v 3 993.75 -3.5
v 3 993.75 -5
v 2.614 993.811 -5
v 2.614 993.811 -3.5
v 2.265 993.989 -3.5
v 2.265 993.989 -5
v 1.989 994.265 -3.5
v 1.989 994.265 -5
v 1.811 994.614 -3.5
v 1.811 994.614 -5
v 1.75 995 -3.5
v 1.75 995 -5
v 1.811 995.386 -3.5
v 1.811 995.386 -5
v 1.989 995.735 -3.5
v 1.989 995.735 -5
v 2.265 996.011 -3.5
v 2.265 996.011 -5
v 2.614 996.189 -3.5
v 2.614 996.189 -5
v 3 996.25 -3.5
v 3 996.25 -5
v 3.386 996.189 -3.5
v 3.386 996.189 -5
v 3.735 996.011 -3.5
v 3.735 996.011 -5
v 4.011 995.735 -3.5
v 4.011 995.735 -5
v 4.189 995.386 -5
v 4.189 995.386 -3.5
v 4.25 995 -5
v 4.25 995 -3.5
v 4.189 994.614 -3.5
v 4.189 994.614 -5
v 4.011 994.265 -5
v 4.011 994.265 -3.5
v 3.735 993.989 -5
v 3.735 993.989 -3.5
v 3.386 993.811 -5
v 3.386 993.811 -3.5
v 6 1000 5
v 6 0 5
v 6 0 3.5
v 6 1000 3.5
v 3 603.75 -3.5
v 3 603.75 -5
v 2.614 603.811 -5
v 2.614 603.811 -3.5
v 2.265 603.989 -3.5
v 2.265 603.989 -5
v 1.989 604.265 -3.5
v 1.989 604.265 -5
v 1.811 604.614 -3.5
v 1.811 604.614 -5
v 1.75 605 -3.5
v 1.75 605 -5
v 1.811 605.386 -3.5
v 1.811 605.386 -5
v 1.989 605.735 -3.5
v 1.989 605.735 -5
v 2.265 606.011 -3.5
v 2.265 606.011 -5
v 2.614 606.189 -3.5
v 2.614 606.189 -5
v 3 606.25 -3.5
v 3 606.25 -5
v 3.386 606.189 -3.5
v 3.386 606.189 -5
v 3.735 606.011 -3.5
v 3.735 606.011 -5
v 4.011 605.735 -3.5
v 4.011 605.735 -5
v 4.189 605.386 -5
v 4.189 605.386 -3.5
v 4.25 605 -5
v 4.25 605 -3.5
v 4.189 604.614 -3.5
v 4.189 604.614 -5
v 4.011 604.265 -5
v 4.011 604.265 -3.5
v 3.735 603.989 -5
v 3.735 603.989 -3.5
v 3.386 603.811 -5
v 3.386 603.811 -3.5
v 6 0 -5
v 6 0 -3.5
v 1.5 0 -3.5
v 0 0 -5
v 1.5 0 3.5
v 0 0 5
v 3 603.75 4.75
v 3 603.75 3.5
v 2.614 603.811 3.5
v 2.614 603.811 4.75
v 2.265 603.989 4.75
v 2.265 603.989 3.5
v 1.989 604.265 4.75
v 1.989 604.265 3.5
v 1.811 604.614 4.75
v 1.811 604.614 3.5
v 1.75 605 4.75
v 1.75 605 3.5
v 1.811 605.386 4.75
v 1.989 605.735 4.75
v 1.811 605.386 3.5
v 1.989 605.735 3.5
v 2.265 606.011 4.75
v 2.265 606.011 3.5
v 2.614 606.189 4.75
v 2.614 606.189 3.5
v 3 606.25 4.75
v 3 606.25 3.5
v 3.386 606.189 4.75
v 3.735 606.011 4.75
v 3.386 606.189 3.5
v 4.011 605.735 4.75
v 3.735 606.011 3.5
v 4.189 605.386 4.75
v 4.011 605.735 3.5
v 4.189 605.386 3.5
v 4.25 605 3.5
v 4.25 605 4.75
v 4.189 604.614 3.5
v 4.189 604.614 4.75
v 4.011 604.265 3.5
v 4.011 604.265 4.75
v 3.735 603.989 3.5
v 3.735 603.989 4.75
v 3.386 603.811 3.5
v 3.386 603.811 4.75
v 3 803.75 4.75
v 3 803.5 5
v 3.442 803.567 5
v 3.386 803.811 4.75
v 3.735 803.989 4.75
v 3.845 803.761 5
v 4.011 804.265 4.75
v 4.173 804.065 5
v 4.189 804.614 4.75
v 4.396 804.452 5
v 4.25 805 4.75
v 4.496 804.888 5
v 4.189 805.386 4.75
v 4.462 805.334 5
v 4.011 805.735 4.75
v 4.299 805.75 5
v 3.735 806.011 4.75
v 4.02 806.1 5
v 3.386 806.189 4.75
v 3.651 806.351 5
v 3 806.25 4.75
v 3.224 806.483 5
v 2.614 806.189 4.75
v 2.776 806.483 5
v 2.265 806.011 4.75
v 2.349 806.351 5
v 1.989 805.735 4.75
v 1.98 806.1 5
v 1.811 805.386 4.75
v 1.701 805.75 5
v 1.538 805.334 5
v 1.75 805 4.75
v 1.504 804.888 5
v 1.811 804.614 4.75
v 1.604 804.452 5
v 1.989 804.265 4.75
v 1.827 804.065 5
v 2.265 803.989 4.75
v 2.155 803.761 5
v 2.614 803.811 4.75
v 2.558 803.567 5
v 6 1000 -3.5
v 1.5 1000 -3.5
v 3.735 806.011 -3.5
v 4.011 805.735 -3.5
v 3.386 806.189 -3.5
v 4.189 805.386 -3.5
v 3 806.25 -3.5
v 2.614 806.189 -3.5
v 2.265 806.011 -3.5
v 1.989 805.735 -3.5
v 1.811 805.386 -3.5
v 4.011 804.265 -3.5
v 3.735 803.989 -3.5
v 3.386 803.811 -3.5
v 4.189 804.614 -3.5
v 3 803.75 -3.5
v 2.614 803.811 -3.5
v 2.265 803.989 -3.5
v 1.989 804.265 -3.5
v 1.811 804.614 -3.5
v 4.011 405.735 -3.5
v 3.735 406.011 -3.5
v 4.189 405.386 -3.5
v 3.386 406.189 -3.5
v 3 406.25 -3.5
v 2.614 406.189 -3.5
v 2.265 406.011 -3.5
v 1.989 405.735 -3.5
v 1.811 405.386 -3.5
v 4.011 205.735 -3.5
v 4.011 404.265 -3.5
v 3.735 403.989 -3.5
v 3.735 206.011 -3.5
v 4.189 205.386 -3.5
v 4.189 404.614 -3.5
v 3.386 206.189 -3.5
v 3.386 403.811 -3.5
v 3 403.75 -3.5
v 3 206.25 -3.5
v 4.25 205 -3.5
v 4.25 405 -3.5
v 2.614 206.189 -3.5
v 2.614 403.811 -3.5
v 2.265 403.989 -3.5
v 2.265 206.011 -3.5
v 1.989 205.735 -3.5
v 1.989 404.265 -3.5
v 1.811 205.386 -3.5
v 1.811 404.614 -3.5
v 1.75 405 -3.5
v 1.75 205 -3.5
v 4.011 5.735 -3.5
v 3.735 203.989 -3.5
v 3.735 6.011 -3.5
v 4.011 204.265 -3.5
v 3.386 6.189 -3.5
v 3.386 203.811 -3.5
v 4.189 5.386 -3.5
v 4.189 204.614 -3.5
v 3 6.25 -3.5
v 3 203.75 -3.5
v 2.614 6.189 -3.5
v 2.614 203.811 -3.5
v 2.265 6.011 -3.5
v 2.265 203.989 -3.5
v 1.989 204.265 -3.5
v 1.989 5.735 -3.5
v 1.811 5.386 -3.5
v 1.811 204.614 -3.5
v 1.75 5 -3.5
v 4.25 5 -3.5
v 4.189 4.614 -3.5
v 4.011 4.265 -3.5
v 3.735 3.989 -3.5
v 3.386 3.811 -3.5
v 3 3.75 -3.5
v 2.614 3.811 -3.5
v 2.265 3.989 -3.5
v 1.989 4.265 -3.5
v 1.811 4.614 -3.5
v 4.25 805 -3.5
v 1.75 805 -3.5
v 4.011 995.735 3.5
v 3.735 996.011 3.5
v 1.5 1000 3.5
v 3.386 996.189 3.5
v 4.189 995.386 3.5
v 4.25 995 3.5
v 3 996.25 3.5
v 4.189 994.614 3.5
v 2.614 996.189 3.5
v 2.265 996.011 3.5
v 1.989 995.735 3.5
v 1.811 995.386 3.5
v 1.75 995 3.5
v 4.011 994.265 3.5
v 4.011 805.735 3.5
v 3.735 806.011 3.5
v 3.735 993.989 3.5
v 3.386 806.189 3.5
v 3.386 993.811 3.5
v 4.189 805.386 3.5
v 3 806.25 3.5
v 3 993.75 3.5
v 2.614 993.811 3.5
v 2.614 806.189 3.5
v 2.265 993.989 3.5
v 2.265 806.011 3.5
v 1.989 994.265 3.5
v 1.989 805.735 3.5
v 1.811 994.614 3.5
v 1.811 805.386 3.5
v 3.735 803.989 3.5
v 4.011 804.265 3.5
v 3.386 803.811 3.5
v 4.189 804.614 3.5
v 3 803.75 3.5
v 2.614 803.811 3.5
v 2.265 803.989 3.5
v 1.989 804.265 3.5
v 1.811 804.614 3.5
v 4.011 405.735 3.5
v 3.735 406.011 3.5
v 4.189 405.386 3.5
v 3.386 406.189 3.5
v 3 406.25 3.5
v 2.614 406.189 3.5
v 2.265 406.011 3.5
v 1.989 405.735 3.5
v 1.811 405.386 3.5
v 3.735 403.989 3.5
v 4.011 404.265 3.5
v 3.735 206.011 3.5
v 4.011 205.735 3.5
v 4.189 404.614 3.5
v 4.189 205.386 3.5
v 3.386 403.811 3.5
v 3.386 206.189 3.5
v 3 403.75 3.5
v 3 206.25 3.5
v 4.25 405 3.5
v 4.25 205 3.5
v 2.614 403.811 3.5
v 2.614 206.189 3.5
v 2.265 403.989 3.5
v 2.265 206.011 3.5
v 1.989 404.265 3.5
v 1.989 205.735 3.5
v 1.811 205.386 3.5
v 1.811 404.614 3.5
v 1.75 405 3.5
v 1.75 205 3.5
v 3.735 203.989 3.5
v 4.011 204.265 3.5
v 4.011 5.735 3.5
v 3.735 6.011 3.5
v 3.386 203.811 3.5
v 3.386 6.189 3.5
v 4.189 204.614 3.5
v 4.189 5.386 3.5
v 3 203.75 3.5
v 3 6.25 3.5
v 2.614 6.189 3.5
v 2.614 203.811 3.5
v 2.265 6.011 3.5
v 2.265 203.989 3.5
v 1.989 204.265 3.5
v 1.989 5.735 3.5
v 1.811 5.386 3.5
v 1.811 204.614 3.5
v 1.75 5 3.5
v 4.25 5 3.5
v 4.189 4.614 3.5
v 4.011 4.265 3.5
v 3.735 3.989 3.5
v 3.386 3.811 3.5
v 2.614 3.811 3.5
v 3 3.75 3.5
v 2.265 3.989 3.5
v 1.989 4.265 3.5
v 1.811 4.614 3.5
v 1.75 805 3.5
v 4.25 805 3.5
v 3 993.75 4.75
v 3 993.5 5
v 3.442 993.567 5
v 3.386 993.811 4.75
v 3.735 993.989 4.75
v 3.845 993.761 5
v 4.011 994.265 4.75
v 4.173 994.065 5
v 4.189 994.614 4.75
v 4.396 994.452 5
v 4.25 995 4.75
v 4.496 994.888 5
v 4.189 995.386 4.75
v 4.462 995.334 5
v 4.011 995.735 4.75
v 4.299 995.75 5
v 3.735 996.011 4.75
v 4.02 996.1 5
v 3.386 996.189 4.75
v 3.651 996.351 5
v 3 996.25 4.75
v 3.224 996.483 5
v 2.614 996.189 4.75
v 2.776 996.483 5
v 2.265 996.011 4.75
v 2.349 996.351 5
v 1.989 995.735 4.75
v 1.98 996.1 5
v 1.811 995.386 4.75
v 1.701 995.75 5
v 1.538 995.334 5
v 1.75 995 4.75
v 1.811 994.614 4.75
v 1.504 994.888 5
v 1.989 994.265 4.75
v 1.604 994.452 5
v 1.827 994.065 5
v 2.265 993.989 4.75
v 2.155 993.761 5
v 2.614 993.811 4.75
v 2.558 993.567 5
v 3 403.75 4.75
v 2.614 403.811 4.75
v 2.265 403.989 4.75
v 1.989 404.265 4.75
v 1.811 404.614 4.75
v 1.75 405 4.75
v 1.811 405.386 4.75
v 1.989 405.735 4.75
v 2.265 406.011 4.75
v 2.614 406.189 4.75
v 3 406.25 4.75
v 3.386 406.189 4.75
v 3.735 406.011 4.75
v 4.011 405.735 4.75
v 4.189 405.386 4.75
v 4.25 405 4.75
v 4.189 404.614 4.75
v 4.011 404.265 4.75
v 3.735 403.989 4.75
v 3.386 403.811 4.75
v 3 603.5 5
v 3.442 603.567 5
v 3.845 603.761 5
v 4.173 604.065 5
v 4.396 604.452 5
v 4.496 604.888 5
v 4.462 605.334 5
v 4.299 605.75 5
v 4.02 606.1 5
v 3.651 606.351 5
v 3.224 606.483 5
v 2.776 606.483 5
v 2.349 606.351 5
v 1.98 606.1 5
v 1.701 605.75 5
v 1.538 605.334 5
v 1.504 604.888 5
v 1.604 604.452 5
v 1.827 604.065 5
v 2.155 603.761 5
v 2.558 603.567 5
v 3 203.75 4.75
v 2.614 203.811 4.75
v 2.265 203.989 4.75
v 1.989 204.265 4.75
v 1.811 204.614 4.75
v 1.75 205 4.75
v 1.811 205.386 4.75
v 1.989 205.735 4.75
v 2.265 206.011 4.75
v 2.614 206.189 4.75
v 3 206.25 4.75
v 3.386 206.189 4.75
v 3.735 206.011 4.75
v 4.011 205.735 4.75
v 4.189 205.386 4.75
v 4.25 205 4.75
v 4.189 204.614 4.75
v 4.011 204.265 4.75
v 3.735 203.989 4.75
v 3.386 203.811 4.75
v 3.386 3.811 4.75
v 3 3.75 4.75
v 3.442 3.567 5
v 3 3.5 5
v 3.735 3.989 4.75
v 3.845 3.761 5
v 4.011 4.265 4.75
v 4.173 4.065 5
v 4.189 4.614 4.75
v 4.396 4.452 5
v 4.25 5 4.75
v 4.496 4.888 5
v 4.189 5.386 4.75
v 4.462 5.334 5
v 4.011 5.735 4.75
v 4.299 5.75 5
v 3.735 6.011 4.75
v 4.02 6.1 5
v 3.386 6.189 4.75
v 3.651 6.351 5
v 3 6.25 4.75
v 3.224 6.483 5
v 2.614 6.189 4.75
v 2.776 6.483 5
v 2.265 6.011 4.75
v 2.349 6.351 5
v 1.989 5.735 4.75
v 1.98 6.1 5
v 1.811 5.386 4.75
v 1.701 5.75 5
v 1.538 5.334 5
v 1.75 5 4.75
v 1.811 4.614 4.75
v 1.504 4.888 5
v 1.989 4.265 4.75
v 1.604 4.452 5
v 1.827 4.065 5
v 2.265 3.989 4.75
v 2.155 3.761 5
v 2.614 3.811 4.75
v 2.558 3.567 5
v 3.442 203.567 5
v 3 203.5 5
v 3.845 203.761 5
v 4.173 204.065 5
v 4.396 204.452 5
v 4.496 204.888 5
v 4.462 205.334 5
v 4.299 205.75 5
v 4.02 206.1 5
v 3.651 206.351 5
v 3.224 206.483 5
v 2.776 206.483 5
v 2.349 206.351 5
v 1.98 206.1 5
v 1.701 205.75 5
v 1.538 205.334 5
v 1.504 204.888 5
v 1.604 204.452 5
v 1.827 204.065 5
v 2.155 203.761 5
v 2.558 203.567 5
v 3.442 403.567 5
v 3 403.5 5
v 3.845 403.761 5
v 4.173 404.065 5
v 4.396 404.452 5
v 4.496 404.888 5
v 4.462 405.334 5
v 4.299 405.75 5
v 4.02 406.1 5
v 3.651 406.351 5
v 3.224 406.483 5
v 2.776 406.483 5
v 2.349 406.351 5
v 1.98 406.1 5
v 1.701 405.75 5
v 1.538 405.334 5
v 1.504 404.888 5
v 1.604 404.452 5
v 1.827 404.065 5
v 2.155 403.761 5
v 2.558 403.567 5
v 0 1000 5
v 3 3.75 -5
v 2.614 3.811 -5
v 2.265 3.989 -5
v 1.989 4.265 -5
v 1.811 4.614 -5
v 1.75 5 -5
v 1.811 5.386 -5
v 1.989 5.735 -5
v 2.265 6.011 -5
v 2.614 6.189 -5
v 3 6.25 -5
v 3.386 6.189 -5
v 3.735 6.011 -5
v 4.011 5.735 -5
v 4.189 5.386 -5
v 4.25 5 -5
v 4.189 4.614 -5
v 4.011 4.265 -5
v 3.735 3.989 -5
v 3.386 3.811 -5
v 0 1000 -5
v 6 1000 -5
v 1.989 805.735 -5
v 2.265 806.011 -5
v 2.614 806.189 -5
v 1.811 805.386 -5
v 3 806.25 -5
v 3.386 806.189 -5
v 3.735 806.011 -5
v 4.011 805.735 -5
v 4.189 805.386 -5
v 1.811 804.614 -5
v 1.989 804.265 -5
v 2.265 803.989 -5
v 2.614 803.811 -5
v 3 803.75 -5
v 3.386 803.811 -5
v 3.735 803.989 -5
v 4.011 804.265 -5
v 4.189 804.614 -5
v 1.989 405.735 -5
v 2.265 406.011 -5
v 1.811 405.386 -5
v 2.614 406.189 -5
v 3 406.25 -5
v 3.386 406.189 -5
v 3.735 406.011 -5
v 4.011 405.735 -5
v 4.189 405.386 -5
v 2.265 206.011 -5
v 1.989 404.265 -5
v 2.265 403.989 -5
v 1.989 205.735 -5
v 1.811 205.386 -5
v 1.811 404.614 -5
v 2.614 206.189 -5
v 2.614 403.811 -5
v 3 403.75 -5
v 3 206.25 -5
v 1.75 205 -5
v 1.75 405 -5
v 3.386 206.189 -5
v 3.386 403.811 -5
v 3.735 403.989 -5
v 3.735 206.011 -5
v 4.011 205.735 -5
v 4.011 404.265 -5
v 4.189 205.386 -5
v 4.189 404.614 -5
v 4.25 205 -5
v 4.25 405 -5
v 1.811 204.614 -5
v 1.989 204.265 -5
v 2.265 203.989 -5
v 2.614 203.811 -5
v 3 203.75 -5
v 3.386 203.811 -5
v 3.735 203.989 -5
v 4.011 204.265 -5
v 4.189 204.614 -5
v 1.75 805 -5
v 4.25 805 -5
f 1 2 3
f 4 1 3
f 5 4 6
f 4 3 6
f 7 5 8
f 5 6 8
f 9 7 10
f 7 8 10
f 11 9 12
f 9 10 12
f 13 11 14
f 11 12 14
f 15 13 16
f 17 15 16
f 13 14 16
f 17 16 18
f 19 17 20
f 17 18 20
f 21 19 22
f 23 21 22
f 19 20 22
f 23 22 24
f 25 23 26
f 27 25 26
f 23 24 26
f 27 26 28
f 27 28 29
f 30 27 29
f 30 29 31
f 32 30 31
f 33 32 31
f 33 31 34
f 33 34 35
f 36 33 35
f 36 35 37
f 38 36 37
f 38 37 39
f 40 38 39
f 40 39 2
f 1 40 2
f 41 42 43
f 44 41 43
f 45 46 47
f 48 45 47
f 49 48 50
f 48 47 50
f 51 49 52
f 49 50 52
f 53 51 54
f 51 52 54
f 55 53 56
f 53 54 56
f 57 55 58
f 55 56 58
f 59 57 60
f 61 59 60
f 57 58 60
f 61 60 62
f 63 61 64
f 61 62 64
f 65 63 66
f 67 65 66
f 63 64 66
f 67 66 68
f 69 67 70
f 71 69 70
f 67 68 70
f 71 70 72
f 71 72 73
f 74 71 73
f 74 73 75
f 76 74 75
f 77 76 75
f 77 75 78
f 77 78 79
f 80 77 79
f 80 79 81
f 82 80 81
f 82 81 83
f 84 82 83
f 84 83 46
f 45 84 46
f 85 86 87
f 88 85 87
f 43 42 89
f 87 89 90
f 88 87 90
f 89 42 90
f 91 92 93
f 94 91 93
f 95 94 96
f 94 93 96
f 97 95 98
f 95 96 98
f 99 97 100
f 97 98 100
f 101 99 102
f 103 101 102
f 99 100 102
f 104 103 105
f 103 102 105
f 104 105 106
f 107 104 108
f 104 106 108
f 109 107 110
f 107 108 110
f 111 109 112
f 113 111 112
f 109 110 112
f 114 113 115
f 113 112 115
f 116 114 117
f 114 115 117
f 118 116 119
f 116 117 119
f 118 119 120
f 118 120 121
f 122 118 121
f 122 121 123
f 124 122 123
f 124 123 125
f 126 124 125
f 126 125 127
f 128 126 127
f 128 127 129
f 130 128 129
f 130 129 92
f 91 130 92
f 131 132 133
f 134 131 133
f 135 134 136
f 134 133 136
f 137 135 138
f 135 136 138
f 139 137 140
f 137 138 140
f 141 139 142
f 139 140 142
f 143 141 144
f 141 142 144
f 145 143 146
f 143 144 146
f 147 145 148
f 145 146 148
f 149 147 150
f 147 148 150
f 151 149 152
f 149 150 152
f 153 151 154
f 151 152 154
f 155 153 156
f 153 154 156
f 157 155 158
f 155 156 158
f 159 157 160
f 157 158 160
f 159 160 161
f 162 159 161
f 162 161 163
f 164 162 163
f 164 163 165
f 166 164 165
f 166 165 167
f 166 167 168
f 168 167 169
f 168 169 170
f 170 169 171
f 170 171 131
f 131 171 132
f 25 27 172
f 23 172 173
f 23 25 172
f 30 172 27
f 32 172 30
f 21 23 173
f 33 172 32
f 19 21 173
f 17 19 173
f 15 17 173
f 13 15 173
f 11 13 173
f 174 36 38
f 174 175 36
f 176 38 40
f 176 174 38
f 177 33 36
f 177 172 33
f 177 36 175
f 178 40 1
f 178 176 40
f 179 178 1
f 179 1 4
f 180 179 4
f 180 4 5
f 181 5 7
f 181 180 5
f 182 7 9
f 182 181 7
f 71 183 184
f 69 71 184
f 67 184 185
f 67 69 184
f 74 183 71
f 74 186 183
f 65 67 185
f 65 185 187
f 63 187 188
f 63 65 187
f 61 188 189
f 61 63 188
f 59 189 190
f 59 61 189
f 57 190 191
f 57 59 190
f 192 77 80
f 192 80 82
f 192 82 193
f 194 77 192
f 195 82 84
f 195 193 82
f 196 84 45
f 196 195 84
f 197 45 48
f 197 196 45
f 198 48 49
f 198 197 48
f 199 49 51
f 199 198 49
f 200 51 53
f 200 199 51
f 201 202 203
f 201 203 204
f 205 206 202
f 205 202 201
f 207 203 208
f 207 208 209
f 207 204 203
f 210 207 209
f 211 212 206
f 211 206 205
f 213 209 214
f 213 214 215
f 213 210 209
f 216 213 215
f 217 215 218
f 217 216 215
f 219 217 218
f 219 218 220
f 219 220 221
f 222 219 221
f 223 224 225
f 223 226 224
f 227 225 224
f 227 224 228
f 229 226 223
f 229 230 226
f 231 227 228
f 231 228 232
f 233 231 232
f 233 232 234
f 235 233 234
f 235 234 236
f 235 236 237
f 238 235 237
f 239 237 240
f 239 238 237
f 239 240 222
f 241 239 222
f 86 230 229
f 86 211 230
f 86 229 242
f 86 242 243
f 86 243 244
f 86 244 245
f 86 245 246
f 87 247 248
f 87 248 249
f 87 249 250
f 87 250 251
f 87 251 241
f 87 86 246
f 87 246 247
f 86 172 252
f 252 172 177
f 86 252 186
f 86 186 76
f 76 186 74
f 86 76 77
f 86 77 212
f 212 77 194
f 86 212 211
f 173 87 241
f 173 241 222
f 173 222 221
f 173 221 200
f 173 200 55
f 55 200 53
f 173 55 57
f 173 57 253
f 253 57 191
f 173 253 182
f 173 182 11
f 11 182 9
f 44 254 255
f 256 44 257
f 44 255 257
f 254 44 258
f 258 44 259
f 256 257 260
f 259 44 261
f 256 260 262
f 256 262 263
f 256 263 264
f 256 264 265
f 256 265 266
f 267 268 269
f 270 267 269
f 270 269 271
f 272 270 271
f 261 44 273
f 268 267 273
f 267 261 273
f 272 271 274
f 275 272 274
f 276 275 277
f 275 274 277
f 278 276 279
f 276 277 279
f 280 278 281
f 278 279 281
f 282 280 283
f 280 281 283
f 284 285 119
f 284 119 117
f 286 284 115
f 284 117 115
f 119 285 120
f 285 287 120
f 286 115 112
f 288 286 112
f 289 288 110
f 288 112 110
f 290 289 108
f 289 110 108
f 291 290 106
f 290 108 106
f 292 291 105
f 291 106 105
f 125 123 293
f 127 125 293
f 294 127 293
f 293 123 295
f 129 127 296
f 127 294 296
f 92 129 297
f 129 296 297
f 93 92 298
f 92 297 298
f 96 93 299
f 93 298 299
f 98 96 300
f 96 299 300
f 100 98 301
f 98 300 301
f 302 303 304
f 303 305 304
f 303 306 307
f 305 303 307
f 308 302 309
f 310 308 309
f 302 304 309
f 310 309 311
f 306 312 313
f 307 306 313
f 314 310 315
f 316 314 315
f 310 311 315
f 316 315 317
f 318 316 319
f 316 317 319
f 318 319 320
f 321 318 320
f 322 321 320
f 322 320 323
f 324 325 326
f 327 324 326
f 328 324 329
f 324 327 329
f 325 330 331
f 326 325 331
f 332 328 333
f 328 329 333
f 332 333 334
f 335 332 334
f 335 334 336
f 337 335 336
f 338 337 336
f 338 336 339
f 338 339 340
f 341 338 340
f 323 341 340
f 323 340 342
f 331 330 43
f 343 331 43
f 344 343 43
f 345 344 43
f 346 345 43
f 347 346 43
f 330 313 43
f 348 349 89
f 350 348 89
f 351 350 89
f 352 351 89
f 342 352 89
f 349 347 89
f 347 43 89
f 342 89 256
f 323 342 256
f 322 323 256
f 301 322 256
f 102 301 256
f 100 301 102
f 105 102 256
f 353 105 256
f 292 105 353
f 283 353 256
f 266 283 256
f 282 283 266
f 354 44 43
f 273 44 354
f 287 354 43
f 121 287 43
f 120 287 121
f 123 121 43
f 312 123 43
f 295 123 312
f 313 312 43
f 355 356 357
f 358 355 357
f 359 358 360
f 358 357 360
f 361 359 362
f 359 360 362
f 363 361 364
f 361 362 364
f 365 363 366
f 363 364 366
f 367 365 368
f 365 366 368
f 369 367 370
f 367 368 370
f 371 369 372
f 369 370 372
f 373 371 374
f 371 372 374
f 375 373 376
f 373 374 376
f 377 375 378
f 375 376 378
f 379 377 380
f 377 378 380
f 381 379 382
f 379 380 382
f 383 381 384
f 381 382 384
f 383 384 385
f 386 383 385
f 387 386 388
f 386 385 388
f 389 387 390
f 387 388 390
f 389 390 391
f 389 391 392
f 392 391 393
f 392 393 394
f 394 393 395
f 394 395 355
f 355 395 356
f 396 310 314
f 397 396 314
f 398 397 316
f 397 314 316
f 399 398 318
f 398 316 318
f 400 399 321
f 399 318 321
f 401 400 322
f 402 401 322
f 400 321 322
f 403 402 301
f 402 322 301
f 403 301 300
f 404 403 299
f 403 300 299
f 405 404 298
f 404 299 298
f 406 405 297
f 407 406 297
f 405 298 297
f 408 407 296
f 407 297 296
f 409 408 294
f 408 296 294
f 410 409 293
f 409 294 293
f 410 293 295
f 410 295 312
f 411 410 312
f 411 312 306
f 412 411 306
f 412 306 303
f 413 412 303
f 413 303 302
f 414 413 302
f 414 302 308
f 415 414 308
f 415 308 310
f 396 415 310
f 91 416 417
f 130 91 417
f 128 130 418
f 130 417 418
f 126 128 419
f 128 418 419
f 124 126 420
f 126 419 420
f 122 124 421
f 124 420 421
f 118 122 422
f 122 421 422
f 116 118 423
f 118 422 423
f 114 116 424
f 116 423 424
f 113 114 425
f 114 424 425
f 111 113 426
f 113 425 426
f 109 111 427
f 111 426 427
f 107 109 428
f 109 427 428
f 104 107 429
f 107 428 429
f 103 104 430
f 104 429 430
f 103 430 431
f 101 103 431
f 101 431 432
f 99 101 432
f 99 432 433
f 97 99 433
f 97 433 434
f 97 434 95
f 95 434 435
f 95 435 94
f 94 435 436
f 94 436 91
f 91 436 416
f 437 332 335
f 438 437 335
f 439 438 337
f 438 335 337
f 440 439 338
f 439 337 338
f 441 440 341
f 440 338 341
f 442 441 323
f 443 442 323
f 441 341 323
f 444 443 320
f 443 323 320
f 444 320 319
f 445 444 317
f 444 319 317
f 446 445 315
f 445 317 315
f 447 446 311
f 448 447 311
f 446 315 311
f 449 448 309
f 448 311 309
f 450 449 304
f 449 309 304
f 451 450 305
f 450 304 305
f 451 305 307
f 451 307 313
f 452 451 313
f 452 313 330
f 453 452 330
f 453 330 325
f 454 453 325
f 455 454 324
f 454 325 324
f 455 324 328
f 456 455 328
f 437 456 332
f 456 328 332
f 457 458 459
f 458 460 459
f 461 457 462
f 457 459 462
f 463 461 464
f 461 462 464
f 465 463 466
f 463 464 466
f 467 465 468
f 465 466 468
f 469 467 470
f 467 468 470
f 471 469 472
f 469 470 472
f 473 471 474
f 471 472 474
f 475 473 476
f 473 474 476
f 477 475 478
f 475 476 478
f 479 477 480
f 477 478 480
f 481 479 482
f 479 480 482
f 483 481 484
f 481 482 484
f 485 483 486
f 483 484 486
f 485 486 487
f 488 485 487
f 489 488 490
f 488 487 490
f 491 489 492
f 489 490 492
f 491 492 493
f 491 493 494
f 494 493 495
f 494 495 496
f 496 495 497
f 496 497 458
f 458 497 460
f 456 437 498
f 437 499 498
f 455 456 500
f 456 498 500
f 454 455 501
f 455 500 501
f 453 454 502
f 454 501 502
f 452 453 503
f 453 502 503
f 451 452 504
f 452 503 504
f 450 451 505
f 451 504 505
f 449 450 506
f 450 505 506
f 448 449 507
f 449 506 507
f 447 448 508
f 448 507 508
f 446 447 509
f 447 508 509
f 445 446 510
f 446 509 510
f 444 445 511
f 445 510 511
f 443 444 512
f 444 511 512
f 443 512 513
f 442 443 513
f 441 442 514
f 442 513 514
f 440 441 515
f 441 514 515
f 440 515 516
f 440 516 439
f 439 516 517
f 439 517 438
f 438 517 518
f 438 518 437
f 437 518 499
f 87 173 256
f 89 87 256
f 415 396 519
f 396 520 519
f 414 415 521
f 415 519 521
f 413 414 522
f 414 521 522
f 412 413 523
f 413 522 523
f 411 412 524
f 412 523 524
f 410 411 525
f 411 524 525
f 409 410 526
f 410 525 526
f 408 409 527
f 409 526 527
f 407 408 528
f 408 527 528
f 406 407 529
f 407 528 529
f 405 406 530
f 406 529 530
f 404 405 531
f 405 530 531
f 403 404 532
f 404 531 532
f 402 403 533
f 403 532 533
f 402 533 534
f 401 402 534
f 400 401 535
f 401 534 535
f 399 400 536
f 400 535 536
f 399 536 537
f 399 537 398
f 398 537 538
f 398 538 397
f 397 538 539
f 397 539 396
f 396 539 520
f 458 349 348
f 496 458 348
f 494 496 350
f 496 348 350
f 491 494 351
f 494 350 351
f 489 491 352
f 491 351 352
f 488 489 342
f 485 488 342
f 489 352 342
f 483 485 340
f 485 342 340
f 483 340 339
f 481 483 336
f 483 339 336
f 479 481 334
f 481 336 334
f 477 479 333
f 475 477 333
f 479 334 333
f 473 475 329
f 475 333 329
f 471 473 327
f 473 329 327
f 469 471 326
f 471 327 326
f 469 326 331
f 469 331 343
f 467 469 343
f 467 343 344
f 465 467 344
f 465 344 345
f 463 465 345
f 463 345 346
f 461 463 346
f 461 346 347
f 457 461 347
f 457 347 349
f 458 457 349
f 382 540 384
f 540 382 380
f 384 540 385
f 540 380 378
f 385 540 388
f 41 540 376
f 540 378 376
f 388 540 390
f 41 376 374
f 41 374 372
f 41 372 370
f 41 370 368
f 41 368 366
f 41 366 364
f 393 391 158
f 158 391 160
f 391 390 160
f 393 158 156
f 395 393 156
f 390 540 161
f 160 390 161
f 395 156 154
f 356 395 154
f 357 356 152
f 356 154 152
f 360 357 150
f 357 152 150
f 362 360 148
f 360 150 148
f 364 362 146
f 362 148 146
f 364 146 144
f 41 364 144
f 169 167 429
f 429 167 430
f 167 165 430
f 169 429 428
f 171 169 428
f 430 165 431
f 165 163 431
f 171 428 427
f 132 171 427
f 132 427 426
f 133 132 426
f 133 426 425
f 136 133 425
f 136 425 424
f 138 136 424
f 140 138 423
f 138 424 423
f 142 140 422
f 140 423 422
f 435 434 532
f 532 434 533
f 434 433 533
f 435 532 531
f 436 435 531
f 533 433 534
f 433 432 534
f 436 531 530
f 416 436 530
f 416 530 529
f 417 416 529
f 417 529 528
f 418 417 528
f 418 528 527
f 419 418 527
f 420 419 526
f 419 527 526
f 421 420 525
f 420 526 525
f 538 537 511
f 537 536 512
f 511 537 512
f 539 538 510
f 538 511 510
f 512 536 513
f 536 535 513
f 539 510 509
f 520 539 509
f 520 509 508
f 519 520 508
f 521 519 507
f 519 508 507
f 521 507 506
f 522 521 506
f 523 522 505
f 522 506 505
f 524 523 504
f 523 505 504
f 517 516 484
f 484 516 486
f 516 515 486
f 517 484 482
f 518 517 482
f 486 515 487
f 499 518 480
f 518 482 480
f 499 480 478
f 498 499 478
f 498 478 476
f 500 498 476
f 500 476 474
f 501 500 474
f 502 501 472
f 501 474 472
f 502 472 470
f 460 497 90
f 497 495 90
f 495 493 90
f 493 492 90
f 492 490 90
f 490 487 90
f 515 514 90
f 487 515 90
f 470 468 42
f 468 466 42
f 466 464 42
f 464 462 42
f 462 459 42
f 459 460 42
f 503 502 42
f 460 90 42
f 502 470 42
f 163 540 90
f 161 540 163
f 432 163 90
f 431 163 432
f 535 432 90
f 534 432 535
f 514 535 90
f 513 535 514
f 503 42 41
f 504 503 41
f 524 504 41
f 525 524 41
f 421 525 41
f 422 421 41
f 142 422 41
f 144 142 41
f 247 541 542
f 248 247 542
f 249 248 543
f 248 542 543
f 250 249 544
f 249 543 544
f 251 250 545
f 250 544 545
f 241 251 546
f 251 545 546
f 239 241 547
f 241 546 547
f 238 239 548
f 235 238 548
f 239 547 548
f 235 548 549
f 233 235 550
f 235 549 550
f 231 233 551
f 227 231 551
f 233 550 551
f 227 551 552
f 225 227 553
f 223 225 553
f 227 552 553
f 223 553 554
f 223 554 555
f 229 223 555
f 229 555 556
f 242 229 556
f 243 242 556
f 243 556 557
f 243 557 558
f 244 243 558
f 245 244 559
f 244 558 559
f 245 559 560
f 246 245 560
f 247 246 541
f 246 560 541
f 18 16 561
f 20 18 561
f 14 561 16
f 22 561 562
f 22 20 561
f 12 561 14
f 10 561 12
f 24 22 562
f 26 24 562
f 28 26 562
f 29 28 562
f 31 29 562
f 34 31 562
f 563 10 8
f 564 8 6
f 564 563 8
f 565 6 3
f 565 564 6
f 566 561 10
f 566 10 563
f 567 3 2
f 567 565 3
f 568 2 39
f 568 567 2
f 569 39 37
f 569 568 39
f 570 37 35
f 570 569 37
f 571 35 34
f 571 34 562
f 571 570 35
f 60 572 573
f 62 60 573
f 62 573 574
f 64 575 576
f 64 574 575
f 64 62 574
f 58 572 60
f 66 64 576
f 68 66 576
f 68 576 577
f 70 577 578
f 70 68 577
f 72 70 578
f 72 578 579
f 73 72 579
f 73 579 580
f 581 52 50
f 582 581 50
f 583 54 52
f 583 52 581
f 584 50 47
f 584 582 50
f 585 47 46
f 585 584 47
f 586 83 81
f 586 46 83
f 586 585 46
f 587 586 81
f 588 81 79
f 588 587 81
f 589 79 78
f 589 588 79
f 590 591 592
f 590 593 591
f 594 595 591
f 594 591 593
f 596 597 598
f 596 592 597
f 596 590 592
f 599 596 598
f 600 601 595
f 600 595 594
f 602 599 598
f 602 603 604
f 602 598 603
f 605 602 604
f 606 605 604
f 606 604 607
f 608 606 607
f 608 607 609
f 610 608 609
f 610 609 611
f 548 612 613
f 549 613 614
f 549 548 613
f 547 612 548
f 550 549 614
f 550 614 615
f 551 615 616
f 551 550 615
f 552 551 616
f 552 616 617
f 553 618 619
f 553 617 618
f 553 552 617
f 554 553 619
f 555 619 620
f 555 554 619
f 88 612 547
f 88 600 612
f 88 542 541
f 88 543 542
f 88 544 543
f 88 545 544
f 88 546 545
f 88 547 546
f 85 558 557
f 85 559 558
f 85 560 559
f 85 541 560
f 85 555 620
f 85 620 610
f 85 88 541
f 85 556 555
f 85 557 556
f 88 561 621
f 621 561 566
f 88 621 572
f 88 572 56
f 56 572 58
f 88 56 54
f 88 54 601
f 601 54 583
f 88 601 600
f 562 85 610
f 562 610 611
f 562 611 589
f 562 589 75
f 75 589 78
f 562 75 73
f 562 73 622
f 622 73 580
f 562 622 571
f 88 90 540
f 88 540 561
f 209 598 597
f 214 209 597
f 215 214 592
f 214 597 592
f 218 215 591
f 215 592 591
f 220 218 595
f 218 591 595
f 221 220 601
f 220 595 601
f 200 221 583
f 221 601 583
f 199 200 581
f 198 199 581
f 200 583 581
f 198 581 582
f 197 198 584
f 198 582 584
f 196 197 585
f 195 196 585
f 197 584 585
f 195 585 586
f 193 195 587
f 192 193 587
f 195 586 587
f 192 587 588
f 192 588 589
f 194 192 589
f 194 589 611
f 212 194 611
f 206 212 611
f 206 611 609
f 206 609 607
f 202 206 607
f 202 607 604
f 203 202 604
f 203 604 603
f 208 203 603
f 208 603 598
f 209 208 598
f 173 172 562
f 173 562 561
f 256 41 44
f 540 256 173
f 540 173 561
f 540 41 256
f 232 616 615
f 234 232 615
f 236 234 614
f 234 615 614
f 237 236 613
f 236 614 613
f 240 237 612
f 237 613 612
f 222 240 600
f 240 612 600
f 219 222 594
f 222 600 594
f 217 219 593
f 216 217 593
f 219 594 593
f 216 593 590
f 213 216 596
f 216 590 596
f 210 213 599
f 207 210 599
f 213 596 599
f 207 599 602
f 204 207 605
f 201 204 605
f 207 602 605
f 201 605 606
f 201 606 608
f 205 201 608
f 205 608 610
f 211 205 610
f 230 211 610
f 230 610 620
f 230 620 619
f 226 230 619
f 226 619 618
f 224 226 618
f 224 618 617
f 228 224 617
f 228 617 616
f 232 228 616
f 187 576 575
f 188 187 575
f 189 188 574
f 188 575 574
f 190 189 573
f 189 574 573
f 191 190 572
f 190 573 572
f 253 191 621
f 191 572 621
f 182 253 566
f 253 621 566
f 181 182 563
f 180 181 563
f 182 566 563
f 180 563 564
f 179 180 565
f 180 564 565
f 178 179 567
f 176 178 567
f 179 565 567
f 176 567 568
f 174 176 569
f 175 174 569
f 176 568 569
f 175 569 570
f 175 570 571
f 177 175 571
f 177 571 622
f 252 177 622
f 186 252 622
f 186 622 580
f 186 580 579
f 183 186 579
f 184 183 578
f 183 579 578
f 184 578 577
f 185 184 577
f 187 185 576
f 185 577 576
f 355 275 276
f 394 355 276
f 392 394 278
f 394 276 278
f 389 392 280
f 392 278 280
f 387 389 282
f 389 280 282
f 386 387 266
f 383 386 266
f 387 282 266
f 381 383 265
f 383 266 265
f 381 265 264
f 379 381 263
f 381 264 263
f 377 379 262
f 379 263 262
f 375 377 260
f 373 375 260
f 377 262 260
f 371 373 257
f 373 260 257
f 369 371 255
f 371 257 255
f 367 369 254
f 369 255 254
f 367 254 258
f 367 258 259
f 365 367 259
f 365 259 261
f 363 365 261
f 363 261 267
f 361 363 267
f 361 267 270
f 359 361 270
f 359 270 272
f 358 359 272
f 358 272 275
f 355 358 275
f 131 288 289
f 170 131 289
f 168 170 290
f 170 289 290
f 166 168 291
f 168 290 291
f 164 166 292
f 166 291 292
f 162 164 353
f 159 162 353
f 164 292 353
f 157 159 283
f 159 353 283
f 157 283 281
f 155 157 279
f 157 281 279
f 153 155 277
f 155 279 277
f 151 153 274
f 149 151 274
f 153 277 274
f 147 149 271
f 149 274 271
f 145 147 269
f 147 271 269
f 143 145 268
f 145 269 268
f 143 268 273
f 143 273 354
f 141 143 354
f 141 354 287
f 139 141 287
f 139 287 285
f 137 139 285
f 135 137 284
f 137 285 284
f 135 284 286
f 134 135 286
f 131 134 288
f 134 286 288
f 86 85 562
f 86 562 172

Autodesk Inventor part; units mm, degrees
ref_plane "YZ Plane" through (0, 0, 0) normal (1, 0, 0) x (0, 1, 0)
ref_plane "XZ Plane" through (0, 0, 0) normal (0, 1, 0) x (-1, 0, 0)
ref_plane "XY Plane" through (0, 0, 0) normal (0, 0, 1) x (1, 0, 0)
sketch "Szkic1" plane through (0, 0, 0) normal (0, 1, 0) x (-1, 0, 0)
  line L0 (0, 0) -> (0, -5)
  line L1 (0, -5) -> (-6, -5)
  line L2 (-6, -5) -> (-6, -3.5)
  line L3 (-6, -3.5) -> (-1.5, -3.5)
  line L4 (-1.5, -3.5) -> (-1.5, 0)
  line L5 (0, 0) -> (-1.5, 0)
  line L6 (0, 0) -> (0, 5)
  line L7 (0, 5) -> (-6, 5)
  line L8 (-6, 5) -> (-6, 3.5)
  line L9 (-6, 3.5) -> (-1.5, 3.5)
  line L10 (-1.5, 3.5) -> (-1.5, 0)
  dimension "d0" = 5
  dimension "d1" = 6
  dimension "d3" = 1.5
  dimension "d41" = 1.5
extrude "Wyciągnięcie proste1" add sketch "Szkic1" along normal blind 1000
sketch "Szkic2" plane through (1.5, 0, -3.5) normal (1, 0, 0) x (0, 0, -1)
  line L0 (-3.5, 0) -> (-3.5, 1000)
  line L1 (-7, 0) -> (-7, 1000) projected
  line L2 (-3.5, 1000) -> (-3.5, 995)
  line L3 (-3.5, 995) -> (-3.5, 795)
  line L4 (-3.5, 795) -> (-3.5, 795)
  line L5 (-3.5, 795) -> (-3.5, 695)
  line L6 (-3.5, 695) -> (-3.5, 595)
  line L7 (-3.5, 595) -> (-3.5, 495)
  line L8 (-7, 0) -> (0, 0) projected
  line L9 (-3.5, 595) -> (-3.5, 395)
  line L10 (-3.5, 395) -> (-3.5, 195)
  line L11 (-3.5, 195) -> (-3.5, 0)
  line L12 (-3.5, 0) -> (-3.5, 5)
  dimension "d7" = 5
  dimension "d13" = 200
  dimension "d14" = 200
  dimension "d16" = 200
  dimension "d17" = 200
  dimension "d18" = 195
  dimension "d19" = 5
sketch "Szkic3" plane through (6, 0, 5) normal (0, 0, 1) x (1, 0, 0)
  line L0 (0, 0) -> (-6, 0) projected
  line L1 (-3, 0) -> (-3, 5)
  line L2 (-3, 5) -> (-3, 205)
  line L3 (-3, 205) -> (-3, 405)
  line L4 (-3, 405) -> (-3, 605)
  line L5 (-3, 605) -> (-3, 805)
  line L6 (-3, 805) -> (-3, 1000)
  line L7 (-3, 1000) -> (-3, 995)
  dimension "d27" = 5
  dimension "d28" = 200
  dimension "d29" = 200
  dimension "d30" = 200
  dimension "d31" = 200
  dimension "d32" = 195
  dimension "d33" = 5
hole "Otwór2" at (3, 5, 5) at (3, 205, 5) at (3, 405, 5) at (3, 605, 5) at (3, 805, 5) at (3, 995, 5) direction (0, 0, -1) diameter 2.5 end through all countersink diameter 3 countersink angle 90
properties part number "prowadnica_profil_c_CPY"
